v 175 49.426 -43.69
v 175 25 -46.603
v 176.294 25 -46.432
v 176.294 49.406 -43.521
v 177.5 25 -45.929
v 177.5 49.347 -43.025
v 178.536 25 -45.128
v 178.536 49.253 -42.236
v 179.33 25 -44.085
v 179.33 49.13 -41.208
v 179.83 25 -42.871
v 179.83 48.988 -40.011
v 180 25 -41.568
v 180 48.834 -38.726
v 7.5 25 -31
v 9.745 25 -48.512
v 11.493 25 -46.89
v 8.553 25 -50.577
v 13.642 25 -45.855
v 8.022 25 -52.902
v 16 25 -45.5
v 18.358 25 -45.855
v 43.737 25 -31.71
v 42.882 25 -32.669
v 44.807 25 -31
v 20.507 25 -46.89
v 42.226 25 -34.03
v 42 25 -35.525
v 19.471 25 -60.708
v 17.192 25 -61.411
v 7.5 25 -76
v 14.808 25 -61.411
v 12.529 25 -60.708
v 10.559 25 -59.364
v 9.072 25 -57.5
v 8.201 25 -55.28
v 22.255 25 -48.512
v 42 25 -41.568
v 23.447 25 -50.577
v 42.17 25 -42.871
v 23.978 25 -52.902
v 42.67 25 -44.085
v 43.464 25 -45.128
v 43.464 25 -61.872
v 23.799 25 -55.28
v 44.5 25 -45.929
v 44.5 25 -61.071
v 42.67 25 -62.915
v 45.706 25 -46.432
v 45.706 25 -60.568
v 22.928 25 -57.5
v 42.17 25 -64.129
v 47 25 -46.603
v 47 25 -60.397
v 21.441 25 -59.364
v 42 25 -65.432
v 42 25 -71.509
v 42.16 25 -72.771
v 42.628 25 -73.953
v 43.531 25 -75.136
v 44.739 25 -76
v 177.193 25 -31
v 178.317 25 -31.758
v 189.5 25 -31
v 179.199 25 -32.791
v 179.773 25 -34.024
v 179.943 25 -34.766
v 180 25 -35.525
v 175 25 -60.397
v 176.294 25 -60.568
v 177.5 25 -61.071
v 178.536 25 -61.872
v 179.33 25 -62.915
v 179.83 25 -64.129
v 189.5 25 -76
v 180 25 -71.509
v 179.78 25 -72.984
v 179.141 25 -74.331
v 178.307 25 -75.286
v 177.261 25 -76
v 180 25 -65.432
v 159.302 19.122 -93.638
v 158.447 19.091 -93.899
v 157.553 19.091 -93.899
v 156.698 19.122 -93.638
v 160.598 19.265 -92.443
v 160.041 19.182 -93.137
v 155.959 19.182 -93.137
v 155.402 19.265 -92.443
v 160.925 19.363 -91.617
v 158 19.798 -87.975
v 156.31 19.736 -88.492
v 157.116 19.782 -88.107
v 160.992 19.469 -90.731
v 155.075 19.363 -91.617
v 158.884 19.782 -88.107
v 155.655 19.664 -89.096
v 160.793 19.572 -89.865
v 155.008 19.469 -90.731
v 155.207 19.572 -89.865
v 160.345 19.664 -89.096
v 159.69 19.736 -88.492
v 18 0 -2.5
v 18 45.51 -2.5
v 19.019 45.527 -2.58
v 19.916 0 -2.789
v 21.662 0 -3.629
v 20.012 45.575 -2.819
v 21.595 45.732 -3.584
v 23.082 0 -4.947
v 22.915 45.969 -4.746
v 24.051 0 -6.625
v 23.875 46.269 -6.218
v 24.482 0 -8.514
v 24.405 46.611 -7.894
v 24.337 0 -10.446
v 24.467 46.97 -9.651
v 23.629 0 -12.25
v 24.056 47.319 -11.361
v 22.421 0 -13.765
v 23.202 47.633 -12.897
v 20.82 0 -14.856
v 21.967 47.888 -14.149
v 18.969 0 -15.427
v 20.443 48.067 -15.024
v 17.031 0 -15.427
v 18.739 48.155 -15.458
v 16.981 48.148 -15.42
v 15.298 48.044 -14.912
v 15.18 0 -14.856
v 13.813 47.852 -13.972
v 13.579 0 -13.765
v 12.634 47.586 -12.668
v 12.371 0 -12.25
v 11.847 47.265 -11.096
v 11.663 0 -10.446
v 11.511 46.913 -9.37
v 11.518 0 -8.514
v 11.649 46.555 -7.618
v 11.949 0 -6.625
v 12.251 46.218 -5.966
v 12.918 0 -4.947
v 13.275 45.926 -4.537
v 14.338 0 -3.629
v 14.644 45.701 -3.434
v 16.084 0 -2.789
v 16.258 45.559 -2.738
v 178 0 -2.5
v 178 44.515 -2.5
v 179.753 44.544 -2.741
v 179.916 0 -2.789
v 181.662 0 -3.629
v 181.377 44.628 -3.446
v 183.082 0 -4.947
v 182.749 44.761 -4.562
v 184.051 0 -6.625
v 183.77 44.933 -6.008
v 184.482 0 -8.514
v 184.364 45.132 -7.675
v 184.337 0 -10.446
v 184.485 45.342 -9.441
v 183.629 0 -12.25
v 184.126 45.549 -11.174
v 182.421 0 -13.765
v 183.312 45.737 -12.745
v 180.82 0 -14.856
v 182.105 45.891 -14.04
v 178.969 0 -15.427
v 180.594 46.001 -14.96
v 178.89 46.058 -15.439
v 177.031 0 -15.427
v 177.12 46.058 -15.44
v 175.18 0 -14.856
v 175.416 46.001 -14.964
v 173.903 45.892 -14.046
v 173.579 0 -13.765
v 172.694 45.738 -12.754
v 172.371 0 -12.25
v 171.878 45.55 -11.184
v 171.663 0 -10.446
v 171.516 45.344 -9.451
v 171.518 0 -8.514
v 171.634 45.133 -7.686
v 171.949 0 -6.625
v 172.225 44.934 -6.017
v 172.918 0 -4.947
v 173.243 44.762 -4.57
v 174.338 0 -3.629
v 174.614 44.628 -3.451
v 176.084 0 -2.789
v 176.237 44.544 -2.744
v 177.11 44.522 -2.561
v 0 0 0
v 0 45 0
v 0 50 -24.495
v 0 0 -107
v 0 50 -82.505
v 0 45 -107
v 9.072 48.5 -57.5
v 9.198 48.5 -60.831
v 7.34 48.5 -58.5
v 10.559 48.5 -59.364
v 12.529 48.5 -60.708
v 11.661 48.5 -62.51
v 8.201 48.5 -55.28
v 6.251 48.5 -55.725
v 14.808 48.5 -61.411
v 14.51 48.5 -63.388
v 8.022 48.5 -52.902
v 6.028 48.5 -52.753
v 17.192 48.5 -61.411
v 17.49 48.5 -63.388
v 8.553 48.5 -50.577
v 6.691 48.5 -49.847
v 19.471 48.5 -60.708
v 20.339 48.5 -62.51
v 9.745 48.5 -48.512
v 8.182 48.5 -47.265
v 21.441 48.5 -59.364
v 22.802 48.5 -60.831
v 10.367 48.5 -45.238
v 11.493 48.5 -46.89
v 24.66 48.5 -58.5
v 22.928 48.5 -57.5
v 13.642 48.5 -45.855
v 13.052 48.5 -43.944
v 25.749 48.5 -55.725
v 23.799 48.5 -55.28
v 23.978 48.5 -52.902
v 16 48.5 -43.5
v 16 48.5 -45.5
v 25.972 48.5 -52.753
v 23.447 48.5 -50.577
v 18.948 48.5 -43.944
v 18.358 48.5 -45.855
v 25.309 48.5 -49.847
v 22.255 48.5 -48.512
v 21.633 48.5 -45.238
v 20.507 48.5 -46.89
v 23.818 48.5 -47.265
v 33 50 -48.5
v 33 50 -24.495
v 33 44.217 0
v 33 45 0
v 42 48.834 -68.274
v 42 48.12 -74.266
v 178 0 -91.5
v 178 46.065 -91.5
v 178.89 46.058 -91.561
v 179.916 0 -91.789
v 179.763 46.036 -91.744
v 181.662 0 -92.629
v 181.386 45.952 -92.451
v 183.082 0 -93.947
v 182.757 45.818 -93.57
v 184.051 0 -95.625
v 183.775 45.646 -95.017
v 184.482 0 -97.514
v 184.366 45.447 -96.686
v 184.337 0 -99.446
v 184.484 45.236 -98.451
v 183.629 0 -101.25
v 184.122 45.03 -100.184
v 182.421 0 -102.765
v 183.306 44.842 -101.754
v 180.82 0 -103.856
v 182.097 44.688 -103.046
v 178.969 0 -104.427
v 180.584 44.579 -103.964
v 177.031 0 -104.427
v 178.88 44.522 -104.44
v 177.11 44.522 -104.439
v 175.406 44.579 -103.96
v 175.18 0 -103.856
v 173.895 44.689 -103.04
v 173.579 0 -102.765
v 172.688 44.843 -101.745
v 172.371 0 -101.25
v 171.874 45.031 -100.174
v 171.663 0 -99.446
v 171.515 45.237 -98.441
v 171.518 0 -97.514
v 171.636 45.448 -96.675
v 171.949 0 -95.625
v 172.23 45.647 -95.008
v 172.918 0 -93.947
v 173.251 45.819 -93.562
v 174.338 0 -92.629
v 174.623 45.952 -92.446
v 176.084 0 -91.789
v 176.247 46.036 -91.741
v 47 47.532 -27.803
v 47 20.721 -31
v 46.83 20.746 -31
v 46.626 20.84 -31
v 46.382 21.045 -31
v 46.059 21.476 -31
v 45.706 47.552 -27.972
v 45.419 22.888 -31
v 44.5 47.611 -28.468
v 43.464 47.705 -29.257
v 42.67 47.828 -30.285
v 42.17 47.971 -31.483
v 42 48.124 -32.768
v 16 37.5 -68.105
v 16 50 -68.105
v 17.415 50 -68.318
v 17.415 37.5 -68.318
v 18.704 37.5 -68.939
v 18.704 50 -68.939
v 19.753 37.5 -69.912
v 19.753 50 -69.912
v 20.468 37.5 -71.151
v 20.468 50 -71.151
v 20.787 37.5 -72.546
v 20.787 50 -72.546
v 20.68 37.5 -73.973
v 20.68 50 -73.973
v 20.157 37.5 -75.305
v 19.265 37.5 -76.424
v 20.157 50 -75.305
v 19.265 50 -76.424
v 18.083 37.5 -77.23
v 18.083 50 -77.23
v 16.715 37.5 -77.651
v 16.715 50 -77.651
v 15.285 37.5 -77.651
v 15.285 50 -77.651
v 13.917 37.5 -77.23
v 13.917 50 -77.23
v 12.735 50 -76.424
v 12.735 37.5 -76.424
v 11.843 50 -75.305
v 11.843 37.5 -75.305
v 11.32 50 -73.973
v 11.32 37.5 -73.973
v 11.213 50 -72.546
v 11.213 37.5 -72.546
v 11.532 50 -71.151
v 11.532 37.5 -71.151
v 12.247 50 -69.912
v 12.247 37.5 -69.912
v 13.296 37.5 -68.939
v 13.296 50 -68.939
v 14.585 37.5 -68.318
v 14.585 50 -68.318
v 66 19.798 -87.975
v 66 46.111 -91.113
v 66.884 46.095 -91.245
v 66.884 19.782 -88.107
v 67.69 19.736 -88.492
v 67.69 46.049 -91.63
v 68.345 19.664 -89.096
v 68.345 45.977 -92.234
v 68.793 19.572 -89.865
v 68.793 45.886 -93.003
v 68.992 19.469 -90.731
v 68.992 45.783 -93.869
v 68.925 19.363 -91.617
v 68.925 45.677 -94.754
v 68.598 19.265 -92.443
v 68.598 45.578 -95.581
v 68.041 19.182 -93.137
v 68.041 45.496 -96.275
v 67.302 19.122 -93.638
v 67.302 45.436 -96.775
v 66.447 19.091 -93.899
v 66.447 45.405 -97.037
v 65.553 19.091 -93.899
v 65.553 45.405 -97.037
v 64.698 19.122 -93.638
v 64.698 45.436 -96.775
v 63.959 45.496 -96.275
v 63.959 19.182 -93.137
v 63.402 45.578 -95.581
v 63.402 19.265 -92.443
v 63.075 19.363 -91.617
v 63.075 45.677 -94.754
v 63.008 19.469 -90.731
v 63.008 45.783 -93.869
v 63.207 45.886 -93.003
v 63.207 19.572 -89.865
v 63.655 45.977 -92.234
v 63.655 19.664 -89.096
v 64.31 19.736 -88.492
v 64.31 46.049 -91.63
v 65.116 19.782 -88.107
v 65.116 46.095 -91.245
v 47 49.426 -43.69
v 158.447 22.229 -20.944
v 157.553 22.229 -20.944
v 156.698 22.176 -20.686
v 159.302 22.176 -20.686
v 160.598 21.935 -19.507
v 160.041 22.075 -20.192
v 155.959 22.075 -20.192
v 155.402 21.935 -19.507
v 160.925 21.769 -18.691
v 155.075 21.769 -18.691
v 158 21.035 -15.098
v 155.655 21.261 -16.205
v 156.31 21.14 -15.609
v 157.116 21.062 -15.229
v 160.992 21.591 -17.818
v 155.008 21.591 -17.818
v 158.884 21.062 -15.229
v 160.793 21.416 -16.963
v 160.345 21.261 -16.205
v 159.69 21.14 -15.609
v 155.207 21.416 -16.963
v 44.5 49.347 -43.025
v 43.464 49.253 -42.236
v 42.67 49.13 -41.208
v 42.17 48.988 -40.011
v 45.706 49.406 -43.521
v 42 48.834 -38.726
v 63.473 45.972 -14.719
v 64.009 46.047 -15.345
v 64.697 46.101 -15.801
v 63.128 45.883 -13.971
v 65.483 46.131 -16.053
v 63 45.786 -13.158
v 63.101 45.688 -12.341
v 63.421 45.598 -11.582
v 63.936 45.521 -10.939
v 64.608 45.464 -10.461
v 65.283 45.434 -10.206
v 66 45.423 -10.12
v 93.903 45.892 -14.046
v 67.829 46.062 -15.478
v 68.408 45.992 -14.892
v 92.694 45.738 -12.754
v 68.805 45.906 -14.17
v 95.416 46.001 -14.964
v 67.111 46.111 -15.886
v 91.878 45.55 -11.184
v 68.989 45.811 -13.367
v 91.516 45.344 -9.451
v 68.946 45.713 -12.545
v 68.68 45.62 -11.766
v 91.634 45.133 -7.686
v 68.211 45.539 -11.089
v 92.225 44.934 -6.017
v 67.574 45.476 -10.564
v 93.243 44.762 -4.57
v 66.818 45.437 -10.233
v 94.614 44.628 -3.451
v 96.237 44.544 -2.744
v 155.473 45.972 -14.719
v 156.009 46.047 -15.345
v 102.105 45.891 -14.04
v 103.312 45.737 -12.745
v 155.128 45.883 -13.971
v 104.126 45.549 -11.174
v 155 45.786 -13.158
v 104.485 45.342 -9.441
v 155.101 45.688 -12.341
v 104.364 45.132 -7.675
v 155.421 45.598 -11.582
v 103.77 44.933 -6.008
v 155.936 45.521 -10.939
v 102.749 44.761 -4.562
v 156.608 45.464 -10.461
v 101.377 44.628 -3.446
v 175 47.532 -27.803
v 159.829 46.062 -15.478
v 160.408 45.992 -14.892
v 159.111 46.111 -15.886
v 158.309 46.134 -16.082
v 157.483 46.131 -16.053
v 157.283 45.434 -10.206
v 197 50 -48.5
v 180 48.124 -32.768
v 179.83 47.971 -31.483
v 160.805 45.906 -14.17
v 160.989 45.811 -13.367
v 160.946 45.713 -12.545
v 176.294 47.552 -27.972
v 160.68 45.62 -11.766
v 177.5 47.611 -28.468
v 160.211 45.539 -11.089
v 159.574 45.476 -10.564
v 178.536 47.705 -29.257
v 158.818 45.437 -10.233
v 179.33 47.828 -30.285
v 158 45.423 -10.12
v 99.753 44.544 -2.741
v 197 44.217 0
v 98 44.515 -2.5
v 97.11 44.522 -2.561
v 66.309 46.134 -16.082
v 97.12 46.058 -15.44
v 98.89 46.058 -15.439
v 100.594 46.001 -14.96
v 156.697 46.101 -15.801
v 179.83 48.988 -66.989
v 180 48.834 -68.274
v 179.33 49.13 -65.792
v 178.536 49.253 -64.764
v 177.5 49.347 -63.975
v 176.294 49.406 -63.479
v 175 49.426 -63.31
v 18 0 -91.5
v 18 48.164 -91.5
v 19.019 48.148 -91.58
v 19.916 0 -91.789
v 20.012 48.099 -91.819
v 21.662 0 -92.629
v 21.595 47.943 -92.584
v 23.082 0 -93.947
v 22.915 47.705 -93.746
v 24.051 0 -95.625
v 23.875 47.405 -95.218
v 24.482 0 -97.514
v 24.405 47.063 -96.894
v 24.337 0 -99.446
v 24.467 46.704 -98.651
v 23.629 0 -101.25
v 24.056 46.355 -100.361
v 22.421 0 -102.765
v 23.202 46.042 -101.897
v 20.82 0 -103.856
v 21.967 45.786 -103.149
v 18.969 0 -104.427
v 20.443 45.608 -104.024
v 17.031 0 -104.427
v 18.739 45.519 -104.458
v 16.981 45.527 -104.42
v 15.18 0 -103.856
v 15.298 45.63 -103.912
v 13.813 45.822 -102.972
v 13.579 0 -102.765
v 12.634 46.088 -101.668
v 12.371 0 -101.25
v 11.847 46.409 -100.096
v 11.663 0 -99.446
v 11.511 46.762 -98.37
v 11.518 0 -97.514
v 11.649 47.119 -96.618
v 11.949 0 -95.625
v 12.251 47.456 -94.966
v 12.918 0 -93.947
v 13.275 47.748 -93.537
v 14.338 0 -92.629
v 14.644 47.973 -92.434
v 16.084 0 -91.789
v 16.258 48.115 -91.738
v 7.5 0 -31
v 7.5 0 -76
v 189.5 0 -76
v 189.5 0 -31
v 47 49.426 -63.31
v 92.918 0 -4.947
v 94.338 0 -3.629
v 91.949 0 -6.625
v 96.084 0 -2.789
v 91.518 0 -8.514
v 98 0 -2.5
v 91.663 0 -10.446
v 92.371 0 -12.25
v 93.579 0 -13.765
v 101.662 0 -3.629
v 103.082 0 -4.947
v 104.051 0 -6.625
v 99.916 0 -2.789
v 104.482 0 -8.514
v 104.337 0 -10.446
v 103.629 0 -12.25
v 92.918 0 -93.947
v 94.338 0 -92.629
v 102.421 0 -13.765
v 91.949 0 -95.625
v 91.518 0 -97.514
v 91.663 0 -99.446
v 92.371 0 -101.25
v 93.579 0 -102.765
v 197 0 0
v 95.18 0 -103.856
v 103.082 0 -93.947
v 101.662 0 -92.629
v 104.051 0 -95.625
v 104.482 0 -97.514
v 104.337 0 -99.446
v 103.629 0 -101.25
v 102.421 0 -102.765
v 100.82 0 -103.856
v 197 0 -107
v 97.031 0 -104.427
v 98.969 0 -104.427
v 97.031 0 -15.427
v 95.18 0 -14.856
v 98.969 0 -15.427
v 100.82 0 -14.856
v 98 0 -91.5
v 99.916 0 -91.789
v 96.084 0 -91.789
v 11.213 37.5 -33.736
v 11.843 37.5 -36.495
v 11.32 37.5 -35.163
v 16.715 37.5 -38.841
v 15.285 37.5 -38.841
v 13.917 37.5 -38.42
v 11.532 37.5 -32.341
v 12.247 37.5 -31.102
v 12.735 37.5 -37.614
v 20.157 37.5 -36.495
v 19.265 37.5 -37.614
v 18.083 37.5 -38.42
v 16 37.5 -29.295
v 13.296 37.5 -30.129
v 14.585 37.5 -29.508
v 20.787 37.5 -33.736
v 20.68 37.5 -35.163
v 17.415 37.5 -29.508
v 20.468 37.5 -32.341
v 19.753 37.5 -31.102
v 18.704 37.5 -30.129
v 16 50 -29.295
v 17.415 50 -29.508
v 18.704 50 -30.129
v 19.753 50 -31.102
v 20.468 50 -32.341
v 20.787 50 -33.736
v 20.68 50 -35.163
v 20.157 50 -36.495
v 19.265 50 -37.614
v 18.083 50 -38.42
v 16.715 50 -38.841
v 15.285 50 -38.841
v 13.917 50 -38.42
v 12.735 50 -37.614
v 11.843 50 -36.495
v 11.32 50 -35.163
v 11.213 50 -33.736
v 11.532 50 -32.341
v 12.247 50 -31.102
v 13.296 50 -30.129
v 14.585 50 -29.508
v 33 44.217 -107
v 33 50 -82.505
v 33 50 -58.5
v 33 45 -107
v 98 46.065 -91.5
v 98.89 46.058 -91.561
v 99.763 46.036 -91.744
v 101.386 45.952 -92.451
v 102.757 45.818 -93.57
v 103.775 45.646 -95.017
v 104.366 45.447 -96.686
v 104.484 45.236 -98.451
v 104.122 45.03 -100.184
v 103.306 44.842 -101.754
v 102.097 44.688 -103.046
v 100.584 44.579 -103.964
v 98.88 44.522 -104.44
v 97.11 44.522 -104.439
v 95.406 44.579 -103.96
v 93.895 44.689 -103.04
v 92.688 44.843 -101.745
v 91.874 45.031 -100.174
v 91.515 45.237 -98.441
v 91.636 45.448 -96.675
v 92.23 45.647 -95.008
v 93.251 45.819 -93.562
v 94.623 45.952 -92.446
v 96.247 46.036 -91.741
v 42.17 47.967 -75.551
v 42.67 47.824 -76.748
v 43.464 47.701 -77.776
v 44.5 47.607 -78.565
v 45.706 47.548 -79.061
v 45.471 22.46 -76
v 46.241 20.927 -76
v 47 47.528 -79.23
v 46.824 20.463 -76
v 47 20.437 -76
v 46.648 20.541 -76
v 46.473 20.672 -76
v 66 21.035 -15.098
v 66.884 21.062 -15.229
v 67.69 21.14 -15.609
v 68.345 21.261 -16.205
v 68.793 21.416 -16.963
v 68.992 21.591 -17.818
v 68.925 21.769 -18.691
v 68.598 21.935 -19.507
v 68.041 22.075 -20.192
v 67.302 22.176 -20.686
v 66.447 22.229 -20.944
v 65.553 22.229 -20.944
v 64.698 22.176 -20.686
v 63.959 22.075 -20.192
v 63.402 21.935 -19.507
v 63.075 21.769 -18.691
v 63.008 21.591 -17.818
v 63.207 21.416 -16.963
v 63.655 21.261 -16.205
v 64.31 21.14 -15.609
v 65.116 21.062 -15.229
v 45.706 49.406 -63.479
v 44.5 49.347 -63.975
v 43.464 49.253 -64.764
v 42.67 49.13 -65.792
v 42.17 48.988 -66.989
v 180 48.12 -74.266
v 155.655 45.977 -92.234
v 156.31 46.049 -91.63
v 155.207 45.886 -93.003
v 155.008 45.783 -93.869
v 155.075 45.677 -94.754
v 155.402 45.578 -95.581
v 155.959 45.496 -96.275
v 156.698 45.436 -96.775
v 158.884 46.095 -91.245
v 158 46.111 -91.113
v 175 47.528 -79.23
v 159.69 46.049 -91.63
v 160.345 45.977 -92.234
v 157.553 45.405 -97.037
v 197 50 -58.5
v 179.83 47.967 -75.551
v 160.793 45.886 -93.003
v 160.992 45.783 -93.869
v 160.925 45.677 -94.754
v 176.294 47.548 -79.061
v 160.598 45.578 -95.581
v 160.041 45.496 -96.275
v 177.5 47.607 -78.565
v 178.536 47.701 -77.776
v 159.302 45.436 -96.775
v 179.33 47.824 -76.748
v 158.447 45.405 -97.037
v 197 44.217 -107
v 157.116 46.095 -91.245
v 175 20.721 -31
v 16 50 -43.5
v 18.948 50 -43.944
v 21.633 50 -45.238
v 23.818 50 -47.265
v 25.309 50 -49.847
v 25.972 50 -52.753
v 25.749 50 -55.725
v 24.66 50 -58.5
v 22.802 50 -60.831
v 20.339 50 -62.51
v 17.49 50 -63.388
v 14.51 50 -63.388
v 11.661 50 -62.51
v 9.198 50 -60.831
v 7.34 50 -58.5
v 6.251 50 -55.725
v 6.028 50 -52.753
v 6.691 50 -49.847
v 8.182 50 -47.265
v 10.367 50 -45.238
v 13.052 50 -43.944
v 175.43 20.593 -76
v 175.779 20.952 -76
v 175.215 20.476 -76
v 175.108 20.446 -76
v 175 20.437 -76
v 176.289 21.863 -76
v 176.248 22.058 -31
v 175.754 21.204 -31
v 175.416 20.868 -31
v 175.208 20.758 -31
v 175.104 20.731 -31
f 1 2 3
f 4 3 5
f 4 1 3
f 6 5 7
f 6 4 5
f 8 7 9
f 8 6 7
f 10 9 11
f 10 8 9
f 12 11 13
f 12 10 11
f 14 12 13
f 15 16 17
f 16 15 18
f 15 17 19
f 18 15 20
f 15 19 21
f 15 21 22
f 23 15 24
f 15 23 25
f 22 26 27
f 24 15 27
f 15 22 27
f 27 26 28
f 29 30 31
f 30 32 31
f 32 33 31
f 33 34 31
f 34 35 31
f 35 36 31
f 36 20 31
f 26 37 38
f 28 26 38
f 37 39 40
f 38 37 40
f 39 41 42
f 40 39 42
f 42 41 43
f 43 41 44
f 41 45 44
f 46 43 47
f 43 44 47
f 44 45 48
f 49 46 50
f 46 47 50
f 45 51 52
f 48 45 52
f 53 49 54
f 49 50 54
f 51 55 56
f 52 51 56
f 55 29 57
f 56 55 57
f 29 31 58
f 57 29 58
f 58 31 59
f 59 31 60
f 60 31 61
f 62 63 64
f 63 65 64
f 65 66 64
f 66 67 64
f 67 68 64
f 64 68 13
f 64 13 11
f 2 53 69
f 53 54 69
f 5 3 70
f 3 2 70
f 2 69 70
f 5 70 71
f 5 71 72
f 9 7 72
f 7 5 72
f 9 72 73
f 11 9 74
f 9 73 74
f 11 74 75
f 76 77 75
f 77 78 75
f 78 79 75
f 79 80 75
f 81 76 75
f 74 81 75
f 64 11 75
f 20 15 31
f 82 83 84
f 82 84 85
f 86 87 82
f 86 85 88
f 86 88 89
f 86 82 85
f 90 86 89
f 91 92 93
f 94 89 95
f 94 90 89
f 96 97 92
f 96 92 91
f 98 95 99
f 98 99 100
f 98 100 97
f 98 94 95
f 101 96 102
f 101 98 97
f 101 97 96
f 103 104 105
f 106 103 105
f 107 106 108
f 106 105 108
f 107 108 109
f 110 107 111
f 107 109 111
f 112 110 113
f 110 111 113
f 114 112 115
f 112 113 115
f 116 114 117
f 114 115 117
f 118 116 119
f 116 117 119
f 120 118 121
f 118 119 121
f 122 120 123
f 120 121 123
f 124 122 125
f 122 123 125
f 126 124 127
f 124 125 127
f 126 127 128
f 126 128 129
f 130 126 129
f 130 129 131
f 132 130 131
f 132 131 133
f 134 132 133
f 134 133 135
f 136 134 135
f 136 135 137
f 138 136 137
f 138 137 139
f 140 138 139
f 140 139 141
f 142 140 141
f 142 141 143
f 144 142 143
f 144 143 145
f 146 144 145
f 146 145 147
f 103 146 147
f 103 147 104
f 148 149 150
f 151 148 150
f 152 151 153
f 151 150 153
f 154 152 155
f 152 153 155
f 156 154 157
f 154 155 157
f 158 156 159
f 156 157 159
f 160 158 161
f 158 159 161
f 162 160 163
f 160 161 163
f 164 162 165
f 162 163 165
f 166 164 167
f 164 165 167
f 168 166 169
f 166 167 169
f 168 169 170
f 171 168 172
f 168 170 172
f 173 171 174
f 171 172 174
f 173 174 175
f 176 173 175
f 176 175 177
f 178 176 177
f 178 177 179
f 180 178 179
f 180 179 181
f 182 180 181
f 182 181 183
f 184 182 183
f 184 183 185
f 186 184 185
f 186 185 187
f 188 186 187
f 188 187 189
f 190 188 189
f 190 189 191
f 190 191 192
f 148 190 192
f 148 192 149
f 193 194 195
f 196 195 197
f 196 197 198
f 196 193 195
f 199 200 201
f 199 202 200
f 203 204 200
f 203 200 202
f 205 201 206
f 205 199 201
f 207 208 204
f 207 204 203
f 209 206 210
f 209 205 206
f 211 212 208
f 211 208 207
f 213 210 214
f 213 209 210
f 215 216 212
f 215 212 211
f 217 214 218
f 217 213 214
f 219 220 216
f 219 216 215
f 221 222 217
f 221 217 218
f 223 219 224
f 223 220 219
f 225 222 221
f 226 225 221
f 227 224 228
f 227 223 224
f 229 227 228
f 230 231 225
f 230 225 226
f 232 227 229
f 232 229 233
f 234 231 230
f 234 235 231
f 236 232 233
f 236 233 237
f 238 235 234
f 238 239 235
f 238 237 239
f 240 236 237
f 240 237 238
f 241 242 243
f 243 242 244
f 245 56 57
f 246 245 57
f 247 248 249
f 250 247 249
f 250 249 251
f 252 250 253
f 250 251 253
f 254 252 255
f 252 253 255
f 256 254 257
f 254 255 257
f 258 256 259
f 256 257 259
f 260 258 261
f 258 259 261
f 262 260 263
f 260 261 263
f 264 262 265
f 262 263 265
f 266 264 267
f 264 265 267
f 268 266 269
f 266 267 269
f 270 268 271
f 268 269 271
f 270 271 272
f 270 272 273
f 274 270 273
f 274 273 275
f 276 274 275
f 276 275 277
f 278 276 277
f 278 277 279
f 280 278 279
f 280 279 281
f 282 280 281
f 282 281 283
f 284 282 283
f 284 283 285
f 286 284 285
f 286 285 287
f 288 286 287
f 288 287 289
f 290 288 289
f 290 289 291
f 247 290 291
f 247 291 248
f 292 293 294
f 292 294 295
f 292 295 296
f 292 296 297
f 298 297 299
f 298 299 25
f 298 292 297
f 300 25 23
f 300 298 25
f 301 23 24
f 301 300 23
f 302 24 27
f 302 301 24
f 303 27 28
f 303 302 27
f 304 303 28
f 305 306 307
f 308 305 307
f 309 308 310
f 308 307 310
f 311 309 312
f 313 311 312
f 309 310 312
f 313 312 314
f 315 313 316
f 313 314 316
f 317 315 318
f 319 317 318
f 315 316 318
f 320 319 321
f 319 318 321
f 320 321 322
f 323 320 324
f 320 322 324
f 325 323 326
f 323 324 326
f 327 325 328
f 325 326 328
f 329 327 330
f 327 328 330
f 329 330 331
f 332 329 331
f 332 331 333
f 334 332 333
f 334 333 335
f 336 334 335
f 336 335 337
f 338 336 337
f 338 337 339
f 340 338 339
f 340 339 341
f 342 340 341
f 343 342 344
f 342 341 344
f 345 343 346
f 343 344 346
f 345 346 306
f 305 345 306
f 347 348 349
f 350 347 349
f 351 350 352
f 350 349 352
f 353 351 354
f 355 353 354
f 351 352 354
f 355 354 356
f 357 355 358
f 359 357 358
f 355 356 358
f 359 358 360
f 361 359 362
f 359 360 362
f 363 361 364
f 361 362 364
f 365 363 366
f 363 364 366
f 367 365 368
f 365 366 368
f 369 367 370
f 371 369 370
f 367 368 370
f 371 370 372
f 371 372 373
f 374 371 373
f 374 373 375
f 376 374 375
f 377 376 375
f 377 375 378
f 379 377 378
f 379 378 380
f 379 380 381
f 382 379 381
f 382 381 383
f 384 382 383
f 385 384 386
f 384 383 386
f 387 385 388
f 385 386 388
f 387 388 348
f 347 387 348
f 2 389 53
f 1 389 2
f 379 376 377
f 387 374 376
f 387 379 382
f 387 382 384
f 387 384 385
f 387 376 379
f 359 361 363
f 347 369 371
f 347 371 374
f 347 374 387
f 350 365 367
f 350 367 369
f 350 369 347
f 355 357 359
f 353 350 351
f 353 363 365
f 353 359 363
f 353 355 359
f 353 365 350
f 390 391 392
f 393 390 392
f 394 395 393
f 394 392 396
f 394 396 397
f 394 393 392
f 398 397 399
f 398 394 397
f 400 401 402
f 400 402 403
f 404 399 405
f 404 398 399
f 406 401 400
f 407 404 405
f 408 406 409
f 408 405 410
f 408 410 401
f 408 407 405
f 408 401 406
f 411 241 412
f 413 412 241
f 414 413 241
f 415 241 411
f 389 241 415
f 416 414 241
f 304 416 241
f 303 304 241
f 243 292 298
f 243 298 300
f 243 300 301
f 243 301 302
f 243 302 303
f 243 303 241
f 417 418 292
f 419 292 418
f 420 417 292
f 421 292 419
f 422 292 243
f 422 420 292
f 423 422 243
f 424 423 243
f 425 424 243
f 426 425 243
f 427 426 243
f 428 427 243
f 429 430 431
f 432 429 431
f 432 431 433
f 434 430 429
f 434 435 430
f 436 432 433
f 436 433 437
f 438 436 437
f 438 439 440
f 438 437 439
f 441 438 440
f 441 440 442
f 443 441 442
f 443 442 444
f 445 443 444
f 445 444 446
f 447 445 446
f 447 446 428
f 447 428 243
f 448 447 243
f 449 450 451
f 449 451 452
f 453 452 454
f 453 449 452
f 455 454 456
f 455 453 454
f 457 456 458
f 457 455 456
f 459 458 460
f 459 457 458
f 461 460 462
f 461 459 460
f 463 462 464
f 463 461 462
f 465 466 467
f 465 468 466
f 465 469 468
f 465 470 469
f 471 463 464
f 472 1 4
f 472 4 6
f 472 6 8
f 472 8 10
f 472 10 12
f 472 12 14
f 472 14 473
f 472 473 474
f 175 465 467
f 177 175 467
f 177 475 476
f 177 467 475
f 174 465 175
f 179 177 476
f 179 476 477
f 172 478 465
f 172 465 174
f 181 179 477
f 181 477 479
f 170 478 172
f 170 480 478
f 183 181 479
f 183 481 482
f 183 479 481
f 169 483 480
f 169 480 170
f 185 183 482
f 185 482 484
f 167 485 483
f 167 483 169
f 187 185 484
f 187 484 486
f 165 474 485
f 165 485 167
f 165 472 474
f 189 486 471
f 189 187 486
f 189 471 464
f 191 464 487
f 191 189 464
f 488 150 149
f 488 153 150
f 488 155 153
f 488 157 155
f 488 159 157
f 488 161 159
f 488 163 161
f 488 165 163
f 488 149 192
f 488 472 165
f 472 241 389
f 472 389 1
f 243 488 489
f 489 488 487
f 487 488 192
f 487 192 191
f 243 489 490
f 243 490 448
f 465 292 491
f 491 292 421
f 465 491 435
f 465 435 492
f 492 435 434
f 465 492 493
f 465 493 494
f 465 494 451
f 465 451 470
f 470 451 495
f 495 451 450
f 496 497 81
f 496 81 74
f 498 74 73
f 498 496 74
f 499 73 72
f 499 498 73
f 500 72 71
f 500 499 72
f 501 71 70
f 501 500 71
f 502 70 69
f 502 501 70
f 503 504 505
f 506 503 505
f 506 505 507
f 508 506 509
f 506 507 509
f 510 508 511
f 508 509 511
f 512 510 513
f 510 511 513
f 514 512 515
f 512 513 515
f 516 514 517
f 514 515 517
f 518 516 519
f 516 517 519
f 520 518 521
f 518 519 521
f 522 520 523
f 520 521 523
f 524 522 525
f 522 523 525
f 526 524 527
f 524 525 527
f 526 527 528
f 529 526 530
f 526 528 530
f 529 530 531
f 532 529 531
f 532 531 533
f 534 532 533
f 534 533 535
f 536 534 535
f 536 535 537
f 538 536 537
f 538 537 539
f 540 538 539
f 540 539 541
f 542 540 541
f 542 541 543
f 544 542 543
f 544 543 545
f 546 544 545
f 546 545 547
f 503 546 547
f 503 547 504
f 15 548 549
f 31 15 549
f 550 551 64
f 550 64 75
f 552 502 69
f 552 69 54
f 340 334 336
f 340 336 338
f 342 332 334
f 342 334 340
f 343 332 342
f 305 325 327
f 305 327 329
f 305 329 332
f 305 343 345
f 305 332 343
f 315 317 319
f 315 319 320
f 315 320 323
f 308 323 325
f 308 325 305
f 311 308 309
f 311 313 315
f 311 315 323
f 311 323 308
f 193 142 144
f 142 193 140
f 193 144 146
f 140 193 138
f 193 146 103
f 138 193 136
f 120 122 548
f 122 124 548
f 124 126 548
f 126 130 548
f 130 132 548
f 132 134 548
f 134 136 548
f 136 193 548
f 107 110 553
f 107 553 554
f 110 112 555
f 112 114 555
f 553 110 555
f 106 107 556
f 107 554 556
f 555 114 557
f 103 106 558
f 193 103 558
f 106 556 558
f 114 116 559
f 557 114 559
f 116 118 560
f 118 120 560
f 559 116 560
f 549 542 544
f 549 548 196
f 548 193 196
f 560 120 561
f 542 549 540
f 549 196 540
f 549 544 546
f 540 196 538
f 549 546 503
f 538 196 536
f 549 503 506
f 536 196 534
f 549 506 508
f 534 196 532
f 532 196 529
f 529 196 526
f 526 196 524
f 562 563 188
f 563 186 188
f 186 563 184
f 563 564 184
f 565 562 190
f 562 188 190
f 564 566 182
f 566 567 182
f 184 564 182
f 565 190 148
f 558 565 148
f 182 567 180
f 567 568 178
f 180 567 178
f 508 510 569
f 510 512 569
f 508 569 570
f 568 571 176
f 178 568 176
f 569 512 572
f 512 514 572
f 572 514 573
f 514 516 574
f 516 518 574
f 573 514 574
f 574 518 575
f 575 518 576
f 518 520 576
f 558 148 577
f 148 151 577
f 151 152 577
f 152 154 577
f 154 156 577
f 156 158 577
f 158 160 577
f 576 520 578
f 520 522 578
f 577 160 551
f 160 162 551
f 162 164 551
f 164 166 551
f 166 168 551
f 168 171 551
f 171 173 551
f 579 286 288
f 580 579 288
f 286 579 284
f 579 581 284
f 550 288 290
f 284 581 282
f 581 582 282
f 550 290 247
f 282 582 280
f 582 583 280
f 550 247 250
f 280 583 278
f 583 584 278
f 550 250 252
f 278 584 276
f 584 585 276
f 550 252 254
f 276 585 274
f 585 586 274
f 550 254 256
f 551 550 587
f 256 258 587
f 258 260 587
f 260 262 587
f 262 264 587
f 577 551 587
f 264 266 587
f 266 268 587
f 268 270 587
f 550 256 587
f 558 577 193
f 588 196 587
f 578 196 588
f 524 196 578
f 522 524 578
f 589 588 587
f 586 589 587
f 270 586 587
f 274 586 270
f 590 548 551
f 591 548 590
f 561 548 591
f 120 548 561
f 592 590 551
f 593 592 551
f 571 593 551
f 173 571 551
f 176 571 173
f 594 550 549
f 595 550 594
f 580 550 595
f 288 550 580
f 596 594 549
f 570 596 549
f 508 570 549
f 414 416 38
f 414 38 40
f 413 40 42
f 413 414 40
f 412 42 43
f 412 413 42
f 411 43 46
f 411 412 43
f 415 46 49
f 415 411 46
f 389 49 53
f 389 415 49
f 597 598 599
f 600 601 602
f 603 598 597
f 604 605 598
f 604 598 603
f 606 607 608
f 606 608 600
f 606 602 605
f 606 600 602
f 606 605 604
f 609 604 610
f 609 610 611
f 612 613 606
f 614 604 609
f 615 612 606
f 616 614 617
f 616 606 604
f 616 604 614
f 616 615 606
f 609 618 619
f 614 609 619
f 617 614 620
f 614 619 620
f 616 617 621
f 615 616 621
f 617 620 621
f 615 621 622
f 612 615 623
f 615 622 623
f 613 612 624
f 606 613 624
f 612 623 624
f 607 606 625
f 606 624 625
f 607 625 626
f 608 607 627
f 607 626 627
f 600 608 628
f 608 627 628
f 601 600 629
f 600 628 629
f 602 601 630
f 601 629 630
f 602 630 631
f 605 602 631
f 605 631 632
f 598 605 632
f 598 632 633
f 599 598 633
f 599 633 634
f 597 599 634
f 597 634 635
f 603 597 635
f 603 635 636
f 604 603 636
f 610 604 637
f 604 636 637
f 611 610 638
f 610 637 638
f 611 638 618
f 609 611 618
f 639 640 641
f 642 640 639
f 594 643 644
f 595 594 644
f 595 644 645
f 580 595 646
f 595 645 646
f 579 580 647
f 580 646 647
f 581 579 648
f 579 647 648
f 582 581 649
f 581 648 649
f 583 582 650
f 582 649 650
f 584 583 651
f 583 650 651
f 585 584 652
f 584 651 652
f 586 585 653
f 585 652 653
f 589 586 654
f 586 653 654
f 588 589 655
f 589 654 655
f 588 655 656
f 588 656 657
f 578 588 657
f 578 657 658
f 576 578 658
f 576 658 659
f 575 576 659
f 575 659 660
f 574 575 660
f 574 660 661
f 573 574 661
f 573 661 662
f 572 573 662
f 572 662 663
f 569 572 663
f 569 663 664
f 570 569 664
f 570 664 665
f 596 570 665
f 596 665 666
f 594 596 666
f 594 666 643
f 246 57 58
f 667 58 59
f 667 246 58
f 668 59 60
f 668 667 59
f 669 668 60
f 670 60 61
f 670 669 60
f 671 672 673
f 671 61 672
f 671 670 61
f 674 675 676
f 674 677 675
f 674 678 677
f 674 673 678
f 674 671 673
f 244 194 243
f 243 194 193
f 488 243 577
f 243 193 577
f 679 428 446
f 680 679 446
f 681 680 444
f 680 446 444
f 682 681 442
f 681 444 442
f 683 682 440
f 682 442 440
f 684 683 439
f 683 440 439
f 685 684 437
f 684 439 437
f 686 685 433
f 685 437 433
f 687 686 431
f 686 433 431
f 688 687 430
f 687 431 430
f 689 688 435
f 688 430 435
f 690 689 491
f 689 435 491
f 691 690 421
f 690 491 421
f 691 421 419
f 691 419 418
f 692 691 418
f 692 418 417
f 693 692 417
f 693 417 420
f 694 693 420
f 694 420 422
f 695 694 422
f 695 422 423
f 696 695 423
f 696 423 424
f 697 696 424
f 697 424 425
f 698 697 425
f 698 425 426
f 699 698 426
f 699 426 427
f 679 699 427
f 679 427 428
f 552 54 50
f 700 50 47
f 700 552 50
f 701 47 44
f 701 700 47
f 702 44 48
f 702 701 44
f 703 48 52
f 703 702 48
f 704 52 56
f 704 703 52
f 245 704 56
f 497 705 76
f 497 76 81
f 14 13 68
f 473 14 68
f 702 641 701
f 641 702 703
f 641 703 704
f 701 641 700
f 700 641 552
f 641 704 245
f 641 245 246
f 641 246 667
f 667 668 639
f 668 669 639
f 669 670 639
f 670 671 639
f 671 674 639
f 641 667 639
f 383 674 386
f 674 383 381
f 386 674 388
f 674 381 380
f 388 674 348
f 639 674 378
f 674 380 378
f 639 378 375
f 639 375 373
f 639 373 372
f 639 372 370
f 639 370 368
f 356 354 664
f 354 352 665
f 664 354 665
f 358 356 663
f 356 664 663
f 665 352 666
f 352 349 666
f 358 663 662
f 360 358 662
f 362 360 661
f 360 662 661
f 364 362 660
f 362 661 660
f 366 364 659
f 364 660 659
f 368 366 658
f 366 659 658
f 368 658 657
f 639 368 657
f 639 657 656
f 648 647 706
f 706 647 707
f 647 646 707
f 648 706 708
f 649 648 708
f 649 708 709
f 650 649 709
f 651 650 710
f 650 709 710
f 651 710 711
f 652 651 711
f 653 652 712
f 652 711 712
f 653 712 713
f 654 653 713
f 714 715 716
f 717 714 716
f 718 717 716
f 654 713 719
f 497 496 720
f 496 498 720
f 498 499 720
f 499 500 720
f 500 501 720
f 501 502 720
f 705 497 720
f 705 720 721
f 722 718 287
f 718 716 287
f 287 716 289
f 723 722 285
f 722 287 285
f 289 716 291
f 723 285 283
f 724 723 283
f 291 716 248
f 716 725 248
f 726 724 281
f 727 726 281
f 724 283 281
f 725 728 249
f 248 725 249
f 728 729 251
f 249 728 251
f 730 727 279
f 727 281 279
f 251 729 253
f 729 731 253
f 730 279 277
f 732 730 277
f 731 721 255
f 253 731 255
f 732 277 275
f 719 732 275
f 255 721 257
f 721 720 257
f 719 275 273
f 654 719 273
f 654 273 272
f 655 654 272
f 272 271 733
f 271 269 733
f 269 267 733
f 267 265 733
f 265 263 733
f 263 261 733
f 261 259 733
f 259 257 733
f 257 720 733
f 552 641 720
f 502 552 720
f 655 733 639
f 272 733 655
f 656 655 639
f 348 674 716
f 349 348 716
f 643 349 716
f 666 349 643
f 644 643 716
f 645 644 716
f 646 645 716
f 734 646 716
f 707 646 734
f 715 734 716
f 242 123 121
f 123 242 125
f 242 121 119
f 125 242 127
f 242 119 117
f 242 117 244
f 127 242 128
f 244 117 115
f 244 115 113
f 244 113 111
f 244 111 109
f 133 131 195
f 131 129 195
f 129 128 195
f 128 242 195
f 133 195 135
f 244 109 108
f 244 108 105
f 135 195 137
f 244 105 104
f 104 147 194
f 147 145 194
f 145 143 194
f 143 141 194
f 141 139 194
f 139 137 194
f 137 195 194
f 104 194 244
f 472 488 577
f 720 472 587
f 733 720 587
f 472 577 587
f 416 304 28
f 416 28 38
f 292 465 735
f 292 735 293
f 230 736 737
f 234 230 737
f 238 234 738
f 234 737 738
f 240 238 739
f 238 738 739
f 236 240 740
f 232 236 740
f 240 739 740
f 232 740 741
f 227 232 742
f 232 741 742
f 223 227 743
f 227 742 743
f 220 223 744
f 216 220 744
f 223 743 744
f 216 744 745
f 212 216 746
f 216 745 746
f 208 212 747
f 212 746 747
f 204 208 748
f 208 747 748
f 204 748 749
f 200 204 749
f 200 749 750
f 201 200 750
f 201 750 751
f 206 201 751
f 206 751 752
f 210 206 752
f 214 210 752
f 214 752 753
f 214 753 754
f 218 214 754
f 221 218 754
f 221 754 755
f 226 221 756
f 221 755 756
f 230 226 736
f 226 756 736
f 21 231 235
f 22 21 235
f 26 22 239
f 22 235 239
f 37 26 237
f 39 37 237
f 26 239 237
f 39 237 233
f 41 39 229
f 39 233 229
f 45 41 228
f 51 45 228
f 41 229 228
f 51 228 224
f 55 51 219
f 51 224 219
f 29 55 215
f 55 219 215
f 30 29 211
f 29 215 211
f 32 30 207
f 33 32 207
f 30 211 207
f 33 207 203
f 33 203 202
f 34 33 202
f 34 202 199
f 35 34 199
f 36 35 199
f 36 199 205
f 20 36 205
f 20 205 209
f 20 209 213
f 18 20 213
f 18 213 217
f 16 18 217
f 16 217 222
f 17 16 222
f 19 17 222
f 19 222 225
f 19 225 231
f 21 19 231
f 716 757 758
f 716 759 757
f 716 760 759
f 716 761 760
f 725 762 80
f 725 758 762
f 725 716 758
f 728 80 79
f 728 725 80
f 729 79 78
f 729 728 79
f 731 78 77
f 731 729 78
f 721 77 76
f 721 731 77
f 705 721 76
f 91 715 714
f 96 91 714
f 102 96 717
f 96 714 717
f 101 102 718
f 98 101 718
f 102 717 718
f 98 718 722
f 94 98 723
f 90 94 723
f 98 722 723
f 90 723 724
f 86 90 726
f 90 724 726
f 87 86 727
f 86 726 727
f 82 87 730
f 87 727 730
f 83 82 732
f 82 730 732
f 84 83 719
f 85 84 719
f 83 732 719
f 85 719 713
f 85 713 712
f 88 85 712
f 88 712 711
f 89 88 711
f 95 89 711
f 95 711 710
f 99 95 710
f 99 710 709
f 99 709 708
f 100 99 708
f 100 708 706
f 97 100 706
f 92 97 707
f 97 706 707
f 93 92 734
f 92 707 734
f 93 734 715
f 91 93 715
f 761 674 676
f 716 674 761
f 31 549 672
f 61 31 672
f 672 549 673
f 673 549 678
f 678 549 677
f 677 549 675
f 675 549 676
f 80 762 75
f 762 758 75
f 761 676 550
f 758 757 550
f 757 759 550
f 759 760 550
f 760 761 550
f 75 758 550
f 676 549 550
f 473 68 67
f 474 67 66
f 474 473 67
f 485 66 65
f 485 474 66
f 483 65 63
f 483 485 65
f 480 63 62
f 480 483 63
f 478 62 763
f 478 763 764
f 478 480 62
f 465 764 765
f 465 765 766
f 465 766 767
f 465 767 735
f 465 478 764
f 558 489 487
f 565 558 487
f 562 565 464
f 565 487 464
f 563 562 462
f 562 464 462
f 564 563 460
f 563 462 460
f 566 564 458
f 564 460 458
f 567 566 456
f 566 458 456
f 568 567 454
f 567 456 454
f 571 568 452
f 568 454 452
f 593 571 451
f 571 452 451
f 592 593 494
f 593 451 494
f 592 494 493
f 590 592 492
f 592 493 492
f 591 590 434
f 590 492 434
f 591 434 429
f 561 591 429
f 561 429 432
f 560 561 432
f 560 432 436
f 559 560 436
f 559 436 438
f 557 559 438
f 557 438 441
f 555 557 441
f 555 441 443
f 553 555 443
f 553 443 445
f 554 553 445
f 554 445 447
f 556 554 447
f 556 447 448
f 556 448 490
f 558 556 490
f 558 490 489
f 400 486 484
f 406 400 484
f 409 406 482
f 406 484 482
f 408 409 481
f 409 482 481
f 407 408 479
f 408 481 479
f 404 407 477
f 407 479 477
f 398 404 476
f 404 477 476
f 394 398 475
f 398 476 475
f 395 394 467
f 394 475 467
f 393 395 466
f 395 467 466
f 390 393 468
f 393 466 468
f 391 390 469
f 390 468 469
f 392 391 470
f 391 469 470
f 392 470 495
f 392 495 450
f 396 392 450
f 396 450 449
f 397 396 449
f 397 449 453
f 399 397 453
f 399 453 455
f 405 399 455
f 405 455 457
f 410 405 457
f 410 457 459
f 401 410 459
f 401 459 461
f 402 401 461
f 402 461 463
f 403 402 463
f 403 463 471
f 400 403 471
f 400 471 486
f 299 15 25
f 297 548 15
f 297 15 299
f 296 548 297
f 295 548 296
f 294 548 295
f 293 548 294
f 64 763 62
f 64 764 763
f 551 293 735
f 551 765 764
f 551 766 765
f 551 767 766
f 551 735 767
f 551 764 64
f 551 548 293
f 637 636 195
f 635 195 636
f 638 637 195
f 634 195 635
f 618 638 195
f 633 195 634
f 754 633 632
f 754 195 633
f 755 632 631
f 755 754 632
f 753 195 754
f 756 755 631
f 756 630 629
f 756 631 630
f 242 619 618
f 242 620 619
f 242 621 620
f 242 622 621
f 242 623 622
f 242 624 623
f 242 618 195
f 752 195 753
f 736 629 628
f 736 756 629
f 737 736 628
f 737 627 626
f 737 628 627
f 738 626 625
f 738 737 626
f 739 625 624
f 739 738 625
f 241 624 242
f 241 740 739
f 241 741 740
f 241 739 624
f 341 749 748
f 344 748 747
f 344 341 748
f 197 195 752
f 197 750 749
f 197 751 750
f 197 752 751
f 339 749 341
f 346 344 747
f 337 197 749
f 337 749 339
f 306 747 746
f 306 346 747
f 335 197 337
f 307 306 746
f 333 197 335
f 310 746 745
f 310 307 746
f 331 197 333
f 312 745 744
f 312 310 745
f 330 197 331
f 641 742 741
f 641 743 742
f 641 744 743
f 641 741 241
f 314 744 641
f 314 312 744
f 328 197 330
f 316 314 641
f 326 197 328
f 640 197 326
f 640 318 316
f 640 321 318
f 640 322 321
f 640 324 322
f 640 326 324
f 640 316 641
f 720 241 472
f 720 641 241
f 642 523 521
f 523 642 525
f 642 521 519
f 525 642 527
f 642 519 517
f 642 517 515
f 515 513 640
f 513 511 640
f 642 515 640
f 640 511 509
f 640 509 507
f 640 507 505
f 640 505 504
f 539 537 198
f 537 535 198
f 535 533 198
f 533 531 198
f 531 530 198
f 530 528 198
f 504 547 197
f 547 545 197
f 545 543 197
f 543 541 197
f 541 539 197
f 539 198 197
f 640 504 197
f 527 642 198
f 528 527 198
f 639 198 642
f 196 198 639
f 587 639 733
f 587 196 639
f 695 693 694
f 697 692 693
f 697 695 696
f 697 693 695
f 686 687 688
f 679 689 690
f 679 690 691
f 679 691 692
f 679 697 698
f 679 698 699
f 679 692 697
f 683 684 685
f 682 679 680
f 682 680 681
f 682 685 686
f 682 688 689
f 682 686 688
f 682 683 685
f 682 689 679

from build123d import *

# Parameters (mm, degrees)
SKETCH1_W           = 197
SKETCH1_H           = 107
BOSS_EXTRUDE1_DEPTH = 50
SKETCH4_W           = 182
SKETCH4_H           = 45
CUT_EXTRUDE2_DEPTH  = 25
CUT_EXTRUDE3_DEPTH  = 164
CUT_EXTRUDE12_DEPTH = 164
CUT_EXTRUDE5_DEPTH  = 230.691096911
SKETCH9_R           = 8
CUT_EXTRUDE6_DEPTH  = 171
SKETCH10_R          = 10
CUT_EXTRUDE7_DEPTH  = 1.5
SKETCH11_R          = 4.8
CUT_EXTRUDE8_DEPTH  = 12.5
SKETCH12_R          = 6.5
CUT_EXTRUDE9_DEPTH  = 230.691096911
SKETCH13_R          = 3
CUT_EXTRUDE10_DEPTH = 26.5
SKETCH14_R          = 3
CUT_EXTRUDE11_DEPTH = 26.5
CUT_EXTRUDE14_DEPTH = 35
CUT_EXTRUDE15_DEPTH = 130


with BuildPart() as part:
    # Sketch1 → Boss-Extrude1 (new body)
    with BuildSketch(Plane(origin=(0, 0, 0), x_dir=(1, 0, 0), z_dir=(0, 1, 0))):
        with Locations((98.5, 53.5)):
            Rectangle(SKETCH1_W, SKETCH1_H)
    extrude(amount=BOSS_EXTRUDE1_DEPTH)

    # Sketch4 → Cut-Extrude2 (cut)
    with BuildSketch(Plane(origin=(0, 0, 0), x_dir=(1, 0, 0), z_dir=(0, 1, 0))):
        with Locations((98.5, 53.5)):
            Rectangle(SKETCH4_W, SKETCH4_H)
    extrude(amount=CUT_EXTRUDE2_DEPTH, mode=Mode.SUBTRACT)

    # Sketch5 → Cut-Extrude3 (cut)
    with BuildSketch(Plane(origin=(197, 0, 0), x_dir=(0, 0, -1), z_dir=(1, 0, 0))):
        Polygon((58.5, 50), (107, 44.216725137), (107, 50), align=None)
    extrude(amount=-CUT_EXTRUDE3_DEPTH, mode=Mode.SUBTRACT)

    # Sketch18 → Cut-Extrude12 (cut)
    with BuildSketch(Plane(origin=(197, 0, 0), x_dir=(0, 0, -1), z_dir=(1, 0, 0))):
        Polygon((0, 44.216725137), (0, 50), (48.5, 50), align=None)
    extrude(amount=-CUT_EXTRUDE12_DEPTH, mode=Mode.SUBTRACT)

    # Sketch7 → Cut-Extrude5 (cut, through all)
    with BuildSketch(Plane(origin=(0, 0, 0), x_dir=(0, 0, -1), z_dir=(1, 0, 0))):
        Polygon((107, 50), (107, 45), (82.505102572, 50), align=None)
        Polygon((0, 45), (0, 50), (24.494897428, 50), align=None)
    extrude(amount=CUT_EXTRUDE5_DEPTH, mode=Mode.SUBTRACT)

    # Sketch9 → Cut-Extrude6 (cut)
    with BuildSketch(Plane(origin=(0, 50, 0), x_dir=(1, 0, 0), z_dir=(0, 1, 0))):
        with Locations(Location((16, 53.5, 0), (0, 0, 270))):
            Circle(SKETCH9_R)
    extrude(amount=-CUT_EXTRUDE6_DEPTH, mode=Mode.SUBTRACT)

    # Sketch10 → Cut-Extrude7 (cut)
    with BuildSketch(Plane(origin=(0, 50, 0), x_dir=(1, 0, 0), z_dir=(0, 1, 0))):
        with Locations(Location((16, 53.5, 0), (0, 0, 270))):
            Circle(SKETCH10_R)
    extrude(amount=-CUT_EXTRUDE7_DEPTH, mode=Mode.SUBTRACT)

    # Sketch11 → Cut-Extrude8 (cut)
    with BuildSketch(Plane(origin=(0, 50, 0), x_dir=(1, 0, 0), z_dir=(0, 1, 0))):
        with Locations(Location((16, 72.905102572, 0), (0, 0, 270))):
            Circle(SKETCH11_R)
        with Locations(Location((16, 34.094897428, 0), (0, 0, 270))):
            Circle(SKETCH11_R)
    extrude(amount=-CUT_EXTRUDE8_DEPTH, mode=Mode.SUBTRACT)

    # Sketch12 → Cut-Extrude9 (cut, through all)
    with BuildSketch(Plane(origin=(0, 50, 0), x_dir=(1, 0, 0), z_dir=(0, 1, 0))):
        with Locations(Location((18, 98, 0), (0, 0, 270))):
            Circle(SKETCH12_R)
        with Locations(Location((98, 9, 0), (0, 0, 270))):
            Circle(SKETCH12_R)
        with Locations(Location((178, 9, 0), (0, 0, 270))):
            Circle(SKETCH12_R)
        with Locations(Location((18, 9, 0), (0, 0, 270))):
            Circle(SKETCH12_R)
        with Locations(Location((98, 98, 0), (0, 0, 270))):
            Circle(SKETCH12_R)
        with Locations(Location((178, 98, 0), (0, 0, 270))):
            Circle(SKETCH12_R)
    extrude(amount=-CUT_EXTRUDE9_DEPTH, mode=Mode.SUBTRACT)

    # Sketch13 → Cut-Extrude10 (cut)
    with BuildSketch(Plane(origin=(0, 56.176931823, -6.698693561), x_dir=(1, 0, 0), z_dir=(0, 0.9929655081065378, -0.11840396830649387))):
        with Locations(Location((66, 88.011873646, 0), (0, 0, 270))):
            Circle(SKETCH13_R)
        with Locations(Location((158, 88.011873646, 0), (0, 0, 270))):
            Circle(SKETCH13_R)
    extrude(amount=-CUT_EXTRUDE10_DEPTH, mode=Mode.SUBTRACT)

    # Sketch14 → Cut-Extrude11 (cut)
    with BuildSketch(Plane(origin=(0, 43.2, 8.818163074), x_dir=(1, 0, 0), z_dir=(0, 0.9797958971132713, 0.2000000000000002))):
        with Locations(Location((66, 22, 0), (0, 0, 270))):
            Circle(SKETCH14_R)
        with Locations(Location((158, 22, 0), (0, 0, 270))):
            Circle(SKETCH14_R)
    extrude(amount=-CUT_EXTRUDE11_DEPTH, mode=Mode.SUBTRACT)

    # Sketch23 → Cut-Extrude14 (cut)
    with BuildSketch(Plane(origin=(0, 43.596828772, 5.198607092), x_dir=(1, 0, 0), z_dir=(0, 0.9929655081065377, 0.11840396830649416))):
        with BuildLine():
            Line((47, 49.235435722), (175, 49.235435722))
            ThreePointArc((175, 49.235435722), (178.535533906, 47.770969628), (180, 44.235435722))
            Line((180, 44.235435722), (180, 38.235435722))
            ThreePointArc((180, 38.235435722), (178.535533906, 34.699901816), (175, 33.235435722))
            Line((175, 33.235435722), (47, 33.235435722))
            ThreePointArc((47, 33.235435722), (43.464466094, 34.699901816), (42, 38.235435722))
            Line((42, 38.235435722), (42, 44.235435722))
            ThreePointArc((42, 44.235435722), (43.464466094, 47.770969628), (47, 49.235435722))
        make_face()
    extrude(amount=-CUT_EXTRUDE14_DEPTH, mode=Mode.SUBTRACT)

    # Sketch6 → Cut-Extrude15 (cut)
    with BuildSketch(Plane(origin=(0, 56.176931823, -6.698693561), x_dir=(1, 0, 0), z_dir=(0, 0.9929655081065378, -0.11840396830649387))):
        with BuildLine():
            Line((47, 73.04559264), (175, 73.04559264))
            ThreePointArc((175, 73.04559264), (178.535533906, 71.581126546), (180, 68.04559264))
            Line((180, 68.04559264), (180, 62.011873646))
            ThreePointArc((180, 62.011873646), (178.535533906, 58.47633974), (175, 57.011873646))
            Line((175, 57.011873646), (47, 57.011873646))
            ThreePointArc((47, 57.011873646), (43.464466094, 58.47633974), (42, 62.011873646))
            Line((42, 62.011873646), (42, 68.04559264))
            ThreePointArc((42, 68.04559264), (43.464466094, 71.581126546), (47, 73.04559264))
        make_face()
    extrude(amount=-CUT_EXTRUDE15_DEPTH, mode=Mode.SUBTRACT)


solid = part.part
